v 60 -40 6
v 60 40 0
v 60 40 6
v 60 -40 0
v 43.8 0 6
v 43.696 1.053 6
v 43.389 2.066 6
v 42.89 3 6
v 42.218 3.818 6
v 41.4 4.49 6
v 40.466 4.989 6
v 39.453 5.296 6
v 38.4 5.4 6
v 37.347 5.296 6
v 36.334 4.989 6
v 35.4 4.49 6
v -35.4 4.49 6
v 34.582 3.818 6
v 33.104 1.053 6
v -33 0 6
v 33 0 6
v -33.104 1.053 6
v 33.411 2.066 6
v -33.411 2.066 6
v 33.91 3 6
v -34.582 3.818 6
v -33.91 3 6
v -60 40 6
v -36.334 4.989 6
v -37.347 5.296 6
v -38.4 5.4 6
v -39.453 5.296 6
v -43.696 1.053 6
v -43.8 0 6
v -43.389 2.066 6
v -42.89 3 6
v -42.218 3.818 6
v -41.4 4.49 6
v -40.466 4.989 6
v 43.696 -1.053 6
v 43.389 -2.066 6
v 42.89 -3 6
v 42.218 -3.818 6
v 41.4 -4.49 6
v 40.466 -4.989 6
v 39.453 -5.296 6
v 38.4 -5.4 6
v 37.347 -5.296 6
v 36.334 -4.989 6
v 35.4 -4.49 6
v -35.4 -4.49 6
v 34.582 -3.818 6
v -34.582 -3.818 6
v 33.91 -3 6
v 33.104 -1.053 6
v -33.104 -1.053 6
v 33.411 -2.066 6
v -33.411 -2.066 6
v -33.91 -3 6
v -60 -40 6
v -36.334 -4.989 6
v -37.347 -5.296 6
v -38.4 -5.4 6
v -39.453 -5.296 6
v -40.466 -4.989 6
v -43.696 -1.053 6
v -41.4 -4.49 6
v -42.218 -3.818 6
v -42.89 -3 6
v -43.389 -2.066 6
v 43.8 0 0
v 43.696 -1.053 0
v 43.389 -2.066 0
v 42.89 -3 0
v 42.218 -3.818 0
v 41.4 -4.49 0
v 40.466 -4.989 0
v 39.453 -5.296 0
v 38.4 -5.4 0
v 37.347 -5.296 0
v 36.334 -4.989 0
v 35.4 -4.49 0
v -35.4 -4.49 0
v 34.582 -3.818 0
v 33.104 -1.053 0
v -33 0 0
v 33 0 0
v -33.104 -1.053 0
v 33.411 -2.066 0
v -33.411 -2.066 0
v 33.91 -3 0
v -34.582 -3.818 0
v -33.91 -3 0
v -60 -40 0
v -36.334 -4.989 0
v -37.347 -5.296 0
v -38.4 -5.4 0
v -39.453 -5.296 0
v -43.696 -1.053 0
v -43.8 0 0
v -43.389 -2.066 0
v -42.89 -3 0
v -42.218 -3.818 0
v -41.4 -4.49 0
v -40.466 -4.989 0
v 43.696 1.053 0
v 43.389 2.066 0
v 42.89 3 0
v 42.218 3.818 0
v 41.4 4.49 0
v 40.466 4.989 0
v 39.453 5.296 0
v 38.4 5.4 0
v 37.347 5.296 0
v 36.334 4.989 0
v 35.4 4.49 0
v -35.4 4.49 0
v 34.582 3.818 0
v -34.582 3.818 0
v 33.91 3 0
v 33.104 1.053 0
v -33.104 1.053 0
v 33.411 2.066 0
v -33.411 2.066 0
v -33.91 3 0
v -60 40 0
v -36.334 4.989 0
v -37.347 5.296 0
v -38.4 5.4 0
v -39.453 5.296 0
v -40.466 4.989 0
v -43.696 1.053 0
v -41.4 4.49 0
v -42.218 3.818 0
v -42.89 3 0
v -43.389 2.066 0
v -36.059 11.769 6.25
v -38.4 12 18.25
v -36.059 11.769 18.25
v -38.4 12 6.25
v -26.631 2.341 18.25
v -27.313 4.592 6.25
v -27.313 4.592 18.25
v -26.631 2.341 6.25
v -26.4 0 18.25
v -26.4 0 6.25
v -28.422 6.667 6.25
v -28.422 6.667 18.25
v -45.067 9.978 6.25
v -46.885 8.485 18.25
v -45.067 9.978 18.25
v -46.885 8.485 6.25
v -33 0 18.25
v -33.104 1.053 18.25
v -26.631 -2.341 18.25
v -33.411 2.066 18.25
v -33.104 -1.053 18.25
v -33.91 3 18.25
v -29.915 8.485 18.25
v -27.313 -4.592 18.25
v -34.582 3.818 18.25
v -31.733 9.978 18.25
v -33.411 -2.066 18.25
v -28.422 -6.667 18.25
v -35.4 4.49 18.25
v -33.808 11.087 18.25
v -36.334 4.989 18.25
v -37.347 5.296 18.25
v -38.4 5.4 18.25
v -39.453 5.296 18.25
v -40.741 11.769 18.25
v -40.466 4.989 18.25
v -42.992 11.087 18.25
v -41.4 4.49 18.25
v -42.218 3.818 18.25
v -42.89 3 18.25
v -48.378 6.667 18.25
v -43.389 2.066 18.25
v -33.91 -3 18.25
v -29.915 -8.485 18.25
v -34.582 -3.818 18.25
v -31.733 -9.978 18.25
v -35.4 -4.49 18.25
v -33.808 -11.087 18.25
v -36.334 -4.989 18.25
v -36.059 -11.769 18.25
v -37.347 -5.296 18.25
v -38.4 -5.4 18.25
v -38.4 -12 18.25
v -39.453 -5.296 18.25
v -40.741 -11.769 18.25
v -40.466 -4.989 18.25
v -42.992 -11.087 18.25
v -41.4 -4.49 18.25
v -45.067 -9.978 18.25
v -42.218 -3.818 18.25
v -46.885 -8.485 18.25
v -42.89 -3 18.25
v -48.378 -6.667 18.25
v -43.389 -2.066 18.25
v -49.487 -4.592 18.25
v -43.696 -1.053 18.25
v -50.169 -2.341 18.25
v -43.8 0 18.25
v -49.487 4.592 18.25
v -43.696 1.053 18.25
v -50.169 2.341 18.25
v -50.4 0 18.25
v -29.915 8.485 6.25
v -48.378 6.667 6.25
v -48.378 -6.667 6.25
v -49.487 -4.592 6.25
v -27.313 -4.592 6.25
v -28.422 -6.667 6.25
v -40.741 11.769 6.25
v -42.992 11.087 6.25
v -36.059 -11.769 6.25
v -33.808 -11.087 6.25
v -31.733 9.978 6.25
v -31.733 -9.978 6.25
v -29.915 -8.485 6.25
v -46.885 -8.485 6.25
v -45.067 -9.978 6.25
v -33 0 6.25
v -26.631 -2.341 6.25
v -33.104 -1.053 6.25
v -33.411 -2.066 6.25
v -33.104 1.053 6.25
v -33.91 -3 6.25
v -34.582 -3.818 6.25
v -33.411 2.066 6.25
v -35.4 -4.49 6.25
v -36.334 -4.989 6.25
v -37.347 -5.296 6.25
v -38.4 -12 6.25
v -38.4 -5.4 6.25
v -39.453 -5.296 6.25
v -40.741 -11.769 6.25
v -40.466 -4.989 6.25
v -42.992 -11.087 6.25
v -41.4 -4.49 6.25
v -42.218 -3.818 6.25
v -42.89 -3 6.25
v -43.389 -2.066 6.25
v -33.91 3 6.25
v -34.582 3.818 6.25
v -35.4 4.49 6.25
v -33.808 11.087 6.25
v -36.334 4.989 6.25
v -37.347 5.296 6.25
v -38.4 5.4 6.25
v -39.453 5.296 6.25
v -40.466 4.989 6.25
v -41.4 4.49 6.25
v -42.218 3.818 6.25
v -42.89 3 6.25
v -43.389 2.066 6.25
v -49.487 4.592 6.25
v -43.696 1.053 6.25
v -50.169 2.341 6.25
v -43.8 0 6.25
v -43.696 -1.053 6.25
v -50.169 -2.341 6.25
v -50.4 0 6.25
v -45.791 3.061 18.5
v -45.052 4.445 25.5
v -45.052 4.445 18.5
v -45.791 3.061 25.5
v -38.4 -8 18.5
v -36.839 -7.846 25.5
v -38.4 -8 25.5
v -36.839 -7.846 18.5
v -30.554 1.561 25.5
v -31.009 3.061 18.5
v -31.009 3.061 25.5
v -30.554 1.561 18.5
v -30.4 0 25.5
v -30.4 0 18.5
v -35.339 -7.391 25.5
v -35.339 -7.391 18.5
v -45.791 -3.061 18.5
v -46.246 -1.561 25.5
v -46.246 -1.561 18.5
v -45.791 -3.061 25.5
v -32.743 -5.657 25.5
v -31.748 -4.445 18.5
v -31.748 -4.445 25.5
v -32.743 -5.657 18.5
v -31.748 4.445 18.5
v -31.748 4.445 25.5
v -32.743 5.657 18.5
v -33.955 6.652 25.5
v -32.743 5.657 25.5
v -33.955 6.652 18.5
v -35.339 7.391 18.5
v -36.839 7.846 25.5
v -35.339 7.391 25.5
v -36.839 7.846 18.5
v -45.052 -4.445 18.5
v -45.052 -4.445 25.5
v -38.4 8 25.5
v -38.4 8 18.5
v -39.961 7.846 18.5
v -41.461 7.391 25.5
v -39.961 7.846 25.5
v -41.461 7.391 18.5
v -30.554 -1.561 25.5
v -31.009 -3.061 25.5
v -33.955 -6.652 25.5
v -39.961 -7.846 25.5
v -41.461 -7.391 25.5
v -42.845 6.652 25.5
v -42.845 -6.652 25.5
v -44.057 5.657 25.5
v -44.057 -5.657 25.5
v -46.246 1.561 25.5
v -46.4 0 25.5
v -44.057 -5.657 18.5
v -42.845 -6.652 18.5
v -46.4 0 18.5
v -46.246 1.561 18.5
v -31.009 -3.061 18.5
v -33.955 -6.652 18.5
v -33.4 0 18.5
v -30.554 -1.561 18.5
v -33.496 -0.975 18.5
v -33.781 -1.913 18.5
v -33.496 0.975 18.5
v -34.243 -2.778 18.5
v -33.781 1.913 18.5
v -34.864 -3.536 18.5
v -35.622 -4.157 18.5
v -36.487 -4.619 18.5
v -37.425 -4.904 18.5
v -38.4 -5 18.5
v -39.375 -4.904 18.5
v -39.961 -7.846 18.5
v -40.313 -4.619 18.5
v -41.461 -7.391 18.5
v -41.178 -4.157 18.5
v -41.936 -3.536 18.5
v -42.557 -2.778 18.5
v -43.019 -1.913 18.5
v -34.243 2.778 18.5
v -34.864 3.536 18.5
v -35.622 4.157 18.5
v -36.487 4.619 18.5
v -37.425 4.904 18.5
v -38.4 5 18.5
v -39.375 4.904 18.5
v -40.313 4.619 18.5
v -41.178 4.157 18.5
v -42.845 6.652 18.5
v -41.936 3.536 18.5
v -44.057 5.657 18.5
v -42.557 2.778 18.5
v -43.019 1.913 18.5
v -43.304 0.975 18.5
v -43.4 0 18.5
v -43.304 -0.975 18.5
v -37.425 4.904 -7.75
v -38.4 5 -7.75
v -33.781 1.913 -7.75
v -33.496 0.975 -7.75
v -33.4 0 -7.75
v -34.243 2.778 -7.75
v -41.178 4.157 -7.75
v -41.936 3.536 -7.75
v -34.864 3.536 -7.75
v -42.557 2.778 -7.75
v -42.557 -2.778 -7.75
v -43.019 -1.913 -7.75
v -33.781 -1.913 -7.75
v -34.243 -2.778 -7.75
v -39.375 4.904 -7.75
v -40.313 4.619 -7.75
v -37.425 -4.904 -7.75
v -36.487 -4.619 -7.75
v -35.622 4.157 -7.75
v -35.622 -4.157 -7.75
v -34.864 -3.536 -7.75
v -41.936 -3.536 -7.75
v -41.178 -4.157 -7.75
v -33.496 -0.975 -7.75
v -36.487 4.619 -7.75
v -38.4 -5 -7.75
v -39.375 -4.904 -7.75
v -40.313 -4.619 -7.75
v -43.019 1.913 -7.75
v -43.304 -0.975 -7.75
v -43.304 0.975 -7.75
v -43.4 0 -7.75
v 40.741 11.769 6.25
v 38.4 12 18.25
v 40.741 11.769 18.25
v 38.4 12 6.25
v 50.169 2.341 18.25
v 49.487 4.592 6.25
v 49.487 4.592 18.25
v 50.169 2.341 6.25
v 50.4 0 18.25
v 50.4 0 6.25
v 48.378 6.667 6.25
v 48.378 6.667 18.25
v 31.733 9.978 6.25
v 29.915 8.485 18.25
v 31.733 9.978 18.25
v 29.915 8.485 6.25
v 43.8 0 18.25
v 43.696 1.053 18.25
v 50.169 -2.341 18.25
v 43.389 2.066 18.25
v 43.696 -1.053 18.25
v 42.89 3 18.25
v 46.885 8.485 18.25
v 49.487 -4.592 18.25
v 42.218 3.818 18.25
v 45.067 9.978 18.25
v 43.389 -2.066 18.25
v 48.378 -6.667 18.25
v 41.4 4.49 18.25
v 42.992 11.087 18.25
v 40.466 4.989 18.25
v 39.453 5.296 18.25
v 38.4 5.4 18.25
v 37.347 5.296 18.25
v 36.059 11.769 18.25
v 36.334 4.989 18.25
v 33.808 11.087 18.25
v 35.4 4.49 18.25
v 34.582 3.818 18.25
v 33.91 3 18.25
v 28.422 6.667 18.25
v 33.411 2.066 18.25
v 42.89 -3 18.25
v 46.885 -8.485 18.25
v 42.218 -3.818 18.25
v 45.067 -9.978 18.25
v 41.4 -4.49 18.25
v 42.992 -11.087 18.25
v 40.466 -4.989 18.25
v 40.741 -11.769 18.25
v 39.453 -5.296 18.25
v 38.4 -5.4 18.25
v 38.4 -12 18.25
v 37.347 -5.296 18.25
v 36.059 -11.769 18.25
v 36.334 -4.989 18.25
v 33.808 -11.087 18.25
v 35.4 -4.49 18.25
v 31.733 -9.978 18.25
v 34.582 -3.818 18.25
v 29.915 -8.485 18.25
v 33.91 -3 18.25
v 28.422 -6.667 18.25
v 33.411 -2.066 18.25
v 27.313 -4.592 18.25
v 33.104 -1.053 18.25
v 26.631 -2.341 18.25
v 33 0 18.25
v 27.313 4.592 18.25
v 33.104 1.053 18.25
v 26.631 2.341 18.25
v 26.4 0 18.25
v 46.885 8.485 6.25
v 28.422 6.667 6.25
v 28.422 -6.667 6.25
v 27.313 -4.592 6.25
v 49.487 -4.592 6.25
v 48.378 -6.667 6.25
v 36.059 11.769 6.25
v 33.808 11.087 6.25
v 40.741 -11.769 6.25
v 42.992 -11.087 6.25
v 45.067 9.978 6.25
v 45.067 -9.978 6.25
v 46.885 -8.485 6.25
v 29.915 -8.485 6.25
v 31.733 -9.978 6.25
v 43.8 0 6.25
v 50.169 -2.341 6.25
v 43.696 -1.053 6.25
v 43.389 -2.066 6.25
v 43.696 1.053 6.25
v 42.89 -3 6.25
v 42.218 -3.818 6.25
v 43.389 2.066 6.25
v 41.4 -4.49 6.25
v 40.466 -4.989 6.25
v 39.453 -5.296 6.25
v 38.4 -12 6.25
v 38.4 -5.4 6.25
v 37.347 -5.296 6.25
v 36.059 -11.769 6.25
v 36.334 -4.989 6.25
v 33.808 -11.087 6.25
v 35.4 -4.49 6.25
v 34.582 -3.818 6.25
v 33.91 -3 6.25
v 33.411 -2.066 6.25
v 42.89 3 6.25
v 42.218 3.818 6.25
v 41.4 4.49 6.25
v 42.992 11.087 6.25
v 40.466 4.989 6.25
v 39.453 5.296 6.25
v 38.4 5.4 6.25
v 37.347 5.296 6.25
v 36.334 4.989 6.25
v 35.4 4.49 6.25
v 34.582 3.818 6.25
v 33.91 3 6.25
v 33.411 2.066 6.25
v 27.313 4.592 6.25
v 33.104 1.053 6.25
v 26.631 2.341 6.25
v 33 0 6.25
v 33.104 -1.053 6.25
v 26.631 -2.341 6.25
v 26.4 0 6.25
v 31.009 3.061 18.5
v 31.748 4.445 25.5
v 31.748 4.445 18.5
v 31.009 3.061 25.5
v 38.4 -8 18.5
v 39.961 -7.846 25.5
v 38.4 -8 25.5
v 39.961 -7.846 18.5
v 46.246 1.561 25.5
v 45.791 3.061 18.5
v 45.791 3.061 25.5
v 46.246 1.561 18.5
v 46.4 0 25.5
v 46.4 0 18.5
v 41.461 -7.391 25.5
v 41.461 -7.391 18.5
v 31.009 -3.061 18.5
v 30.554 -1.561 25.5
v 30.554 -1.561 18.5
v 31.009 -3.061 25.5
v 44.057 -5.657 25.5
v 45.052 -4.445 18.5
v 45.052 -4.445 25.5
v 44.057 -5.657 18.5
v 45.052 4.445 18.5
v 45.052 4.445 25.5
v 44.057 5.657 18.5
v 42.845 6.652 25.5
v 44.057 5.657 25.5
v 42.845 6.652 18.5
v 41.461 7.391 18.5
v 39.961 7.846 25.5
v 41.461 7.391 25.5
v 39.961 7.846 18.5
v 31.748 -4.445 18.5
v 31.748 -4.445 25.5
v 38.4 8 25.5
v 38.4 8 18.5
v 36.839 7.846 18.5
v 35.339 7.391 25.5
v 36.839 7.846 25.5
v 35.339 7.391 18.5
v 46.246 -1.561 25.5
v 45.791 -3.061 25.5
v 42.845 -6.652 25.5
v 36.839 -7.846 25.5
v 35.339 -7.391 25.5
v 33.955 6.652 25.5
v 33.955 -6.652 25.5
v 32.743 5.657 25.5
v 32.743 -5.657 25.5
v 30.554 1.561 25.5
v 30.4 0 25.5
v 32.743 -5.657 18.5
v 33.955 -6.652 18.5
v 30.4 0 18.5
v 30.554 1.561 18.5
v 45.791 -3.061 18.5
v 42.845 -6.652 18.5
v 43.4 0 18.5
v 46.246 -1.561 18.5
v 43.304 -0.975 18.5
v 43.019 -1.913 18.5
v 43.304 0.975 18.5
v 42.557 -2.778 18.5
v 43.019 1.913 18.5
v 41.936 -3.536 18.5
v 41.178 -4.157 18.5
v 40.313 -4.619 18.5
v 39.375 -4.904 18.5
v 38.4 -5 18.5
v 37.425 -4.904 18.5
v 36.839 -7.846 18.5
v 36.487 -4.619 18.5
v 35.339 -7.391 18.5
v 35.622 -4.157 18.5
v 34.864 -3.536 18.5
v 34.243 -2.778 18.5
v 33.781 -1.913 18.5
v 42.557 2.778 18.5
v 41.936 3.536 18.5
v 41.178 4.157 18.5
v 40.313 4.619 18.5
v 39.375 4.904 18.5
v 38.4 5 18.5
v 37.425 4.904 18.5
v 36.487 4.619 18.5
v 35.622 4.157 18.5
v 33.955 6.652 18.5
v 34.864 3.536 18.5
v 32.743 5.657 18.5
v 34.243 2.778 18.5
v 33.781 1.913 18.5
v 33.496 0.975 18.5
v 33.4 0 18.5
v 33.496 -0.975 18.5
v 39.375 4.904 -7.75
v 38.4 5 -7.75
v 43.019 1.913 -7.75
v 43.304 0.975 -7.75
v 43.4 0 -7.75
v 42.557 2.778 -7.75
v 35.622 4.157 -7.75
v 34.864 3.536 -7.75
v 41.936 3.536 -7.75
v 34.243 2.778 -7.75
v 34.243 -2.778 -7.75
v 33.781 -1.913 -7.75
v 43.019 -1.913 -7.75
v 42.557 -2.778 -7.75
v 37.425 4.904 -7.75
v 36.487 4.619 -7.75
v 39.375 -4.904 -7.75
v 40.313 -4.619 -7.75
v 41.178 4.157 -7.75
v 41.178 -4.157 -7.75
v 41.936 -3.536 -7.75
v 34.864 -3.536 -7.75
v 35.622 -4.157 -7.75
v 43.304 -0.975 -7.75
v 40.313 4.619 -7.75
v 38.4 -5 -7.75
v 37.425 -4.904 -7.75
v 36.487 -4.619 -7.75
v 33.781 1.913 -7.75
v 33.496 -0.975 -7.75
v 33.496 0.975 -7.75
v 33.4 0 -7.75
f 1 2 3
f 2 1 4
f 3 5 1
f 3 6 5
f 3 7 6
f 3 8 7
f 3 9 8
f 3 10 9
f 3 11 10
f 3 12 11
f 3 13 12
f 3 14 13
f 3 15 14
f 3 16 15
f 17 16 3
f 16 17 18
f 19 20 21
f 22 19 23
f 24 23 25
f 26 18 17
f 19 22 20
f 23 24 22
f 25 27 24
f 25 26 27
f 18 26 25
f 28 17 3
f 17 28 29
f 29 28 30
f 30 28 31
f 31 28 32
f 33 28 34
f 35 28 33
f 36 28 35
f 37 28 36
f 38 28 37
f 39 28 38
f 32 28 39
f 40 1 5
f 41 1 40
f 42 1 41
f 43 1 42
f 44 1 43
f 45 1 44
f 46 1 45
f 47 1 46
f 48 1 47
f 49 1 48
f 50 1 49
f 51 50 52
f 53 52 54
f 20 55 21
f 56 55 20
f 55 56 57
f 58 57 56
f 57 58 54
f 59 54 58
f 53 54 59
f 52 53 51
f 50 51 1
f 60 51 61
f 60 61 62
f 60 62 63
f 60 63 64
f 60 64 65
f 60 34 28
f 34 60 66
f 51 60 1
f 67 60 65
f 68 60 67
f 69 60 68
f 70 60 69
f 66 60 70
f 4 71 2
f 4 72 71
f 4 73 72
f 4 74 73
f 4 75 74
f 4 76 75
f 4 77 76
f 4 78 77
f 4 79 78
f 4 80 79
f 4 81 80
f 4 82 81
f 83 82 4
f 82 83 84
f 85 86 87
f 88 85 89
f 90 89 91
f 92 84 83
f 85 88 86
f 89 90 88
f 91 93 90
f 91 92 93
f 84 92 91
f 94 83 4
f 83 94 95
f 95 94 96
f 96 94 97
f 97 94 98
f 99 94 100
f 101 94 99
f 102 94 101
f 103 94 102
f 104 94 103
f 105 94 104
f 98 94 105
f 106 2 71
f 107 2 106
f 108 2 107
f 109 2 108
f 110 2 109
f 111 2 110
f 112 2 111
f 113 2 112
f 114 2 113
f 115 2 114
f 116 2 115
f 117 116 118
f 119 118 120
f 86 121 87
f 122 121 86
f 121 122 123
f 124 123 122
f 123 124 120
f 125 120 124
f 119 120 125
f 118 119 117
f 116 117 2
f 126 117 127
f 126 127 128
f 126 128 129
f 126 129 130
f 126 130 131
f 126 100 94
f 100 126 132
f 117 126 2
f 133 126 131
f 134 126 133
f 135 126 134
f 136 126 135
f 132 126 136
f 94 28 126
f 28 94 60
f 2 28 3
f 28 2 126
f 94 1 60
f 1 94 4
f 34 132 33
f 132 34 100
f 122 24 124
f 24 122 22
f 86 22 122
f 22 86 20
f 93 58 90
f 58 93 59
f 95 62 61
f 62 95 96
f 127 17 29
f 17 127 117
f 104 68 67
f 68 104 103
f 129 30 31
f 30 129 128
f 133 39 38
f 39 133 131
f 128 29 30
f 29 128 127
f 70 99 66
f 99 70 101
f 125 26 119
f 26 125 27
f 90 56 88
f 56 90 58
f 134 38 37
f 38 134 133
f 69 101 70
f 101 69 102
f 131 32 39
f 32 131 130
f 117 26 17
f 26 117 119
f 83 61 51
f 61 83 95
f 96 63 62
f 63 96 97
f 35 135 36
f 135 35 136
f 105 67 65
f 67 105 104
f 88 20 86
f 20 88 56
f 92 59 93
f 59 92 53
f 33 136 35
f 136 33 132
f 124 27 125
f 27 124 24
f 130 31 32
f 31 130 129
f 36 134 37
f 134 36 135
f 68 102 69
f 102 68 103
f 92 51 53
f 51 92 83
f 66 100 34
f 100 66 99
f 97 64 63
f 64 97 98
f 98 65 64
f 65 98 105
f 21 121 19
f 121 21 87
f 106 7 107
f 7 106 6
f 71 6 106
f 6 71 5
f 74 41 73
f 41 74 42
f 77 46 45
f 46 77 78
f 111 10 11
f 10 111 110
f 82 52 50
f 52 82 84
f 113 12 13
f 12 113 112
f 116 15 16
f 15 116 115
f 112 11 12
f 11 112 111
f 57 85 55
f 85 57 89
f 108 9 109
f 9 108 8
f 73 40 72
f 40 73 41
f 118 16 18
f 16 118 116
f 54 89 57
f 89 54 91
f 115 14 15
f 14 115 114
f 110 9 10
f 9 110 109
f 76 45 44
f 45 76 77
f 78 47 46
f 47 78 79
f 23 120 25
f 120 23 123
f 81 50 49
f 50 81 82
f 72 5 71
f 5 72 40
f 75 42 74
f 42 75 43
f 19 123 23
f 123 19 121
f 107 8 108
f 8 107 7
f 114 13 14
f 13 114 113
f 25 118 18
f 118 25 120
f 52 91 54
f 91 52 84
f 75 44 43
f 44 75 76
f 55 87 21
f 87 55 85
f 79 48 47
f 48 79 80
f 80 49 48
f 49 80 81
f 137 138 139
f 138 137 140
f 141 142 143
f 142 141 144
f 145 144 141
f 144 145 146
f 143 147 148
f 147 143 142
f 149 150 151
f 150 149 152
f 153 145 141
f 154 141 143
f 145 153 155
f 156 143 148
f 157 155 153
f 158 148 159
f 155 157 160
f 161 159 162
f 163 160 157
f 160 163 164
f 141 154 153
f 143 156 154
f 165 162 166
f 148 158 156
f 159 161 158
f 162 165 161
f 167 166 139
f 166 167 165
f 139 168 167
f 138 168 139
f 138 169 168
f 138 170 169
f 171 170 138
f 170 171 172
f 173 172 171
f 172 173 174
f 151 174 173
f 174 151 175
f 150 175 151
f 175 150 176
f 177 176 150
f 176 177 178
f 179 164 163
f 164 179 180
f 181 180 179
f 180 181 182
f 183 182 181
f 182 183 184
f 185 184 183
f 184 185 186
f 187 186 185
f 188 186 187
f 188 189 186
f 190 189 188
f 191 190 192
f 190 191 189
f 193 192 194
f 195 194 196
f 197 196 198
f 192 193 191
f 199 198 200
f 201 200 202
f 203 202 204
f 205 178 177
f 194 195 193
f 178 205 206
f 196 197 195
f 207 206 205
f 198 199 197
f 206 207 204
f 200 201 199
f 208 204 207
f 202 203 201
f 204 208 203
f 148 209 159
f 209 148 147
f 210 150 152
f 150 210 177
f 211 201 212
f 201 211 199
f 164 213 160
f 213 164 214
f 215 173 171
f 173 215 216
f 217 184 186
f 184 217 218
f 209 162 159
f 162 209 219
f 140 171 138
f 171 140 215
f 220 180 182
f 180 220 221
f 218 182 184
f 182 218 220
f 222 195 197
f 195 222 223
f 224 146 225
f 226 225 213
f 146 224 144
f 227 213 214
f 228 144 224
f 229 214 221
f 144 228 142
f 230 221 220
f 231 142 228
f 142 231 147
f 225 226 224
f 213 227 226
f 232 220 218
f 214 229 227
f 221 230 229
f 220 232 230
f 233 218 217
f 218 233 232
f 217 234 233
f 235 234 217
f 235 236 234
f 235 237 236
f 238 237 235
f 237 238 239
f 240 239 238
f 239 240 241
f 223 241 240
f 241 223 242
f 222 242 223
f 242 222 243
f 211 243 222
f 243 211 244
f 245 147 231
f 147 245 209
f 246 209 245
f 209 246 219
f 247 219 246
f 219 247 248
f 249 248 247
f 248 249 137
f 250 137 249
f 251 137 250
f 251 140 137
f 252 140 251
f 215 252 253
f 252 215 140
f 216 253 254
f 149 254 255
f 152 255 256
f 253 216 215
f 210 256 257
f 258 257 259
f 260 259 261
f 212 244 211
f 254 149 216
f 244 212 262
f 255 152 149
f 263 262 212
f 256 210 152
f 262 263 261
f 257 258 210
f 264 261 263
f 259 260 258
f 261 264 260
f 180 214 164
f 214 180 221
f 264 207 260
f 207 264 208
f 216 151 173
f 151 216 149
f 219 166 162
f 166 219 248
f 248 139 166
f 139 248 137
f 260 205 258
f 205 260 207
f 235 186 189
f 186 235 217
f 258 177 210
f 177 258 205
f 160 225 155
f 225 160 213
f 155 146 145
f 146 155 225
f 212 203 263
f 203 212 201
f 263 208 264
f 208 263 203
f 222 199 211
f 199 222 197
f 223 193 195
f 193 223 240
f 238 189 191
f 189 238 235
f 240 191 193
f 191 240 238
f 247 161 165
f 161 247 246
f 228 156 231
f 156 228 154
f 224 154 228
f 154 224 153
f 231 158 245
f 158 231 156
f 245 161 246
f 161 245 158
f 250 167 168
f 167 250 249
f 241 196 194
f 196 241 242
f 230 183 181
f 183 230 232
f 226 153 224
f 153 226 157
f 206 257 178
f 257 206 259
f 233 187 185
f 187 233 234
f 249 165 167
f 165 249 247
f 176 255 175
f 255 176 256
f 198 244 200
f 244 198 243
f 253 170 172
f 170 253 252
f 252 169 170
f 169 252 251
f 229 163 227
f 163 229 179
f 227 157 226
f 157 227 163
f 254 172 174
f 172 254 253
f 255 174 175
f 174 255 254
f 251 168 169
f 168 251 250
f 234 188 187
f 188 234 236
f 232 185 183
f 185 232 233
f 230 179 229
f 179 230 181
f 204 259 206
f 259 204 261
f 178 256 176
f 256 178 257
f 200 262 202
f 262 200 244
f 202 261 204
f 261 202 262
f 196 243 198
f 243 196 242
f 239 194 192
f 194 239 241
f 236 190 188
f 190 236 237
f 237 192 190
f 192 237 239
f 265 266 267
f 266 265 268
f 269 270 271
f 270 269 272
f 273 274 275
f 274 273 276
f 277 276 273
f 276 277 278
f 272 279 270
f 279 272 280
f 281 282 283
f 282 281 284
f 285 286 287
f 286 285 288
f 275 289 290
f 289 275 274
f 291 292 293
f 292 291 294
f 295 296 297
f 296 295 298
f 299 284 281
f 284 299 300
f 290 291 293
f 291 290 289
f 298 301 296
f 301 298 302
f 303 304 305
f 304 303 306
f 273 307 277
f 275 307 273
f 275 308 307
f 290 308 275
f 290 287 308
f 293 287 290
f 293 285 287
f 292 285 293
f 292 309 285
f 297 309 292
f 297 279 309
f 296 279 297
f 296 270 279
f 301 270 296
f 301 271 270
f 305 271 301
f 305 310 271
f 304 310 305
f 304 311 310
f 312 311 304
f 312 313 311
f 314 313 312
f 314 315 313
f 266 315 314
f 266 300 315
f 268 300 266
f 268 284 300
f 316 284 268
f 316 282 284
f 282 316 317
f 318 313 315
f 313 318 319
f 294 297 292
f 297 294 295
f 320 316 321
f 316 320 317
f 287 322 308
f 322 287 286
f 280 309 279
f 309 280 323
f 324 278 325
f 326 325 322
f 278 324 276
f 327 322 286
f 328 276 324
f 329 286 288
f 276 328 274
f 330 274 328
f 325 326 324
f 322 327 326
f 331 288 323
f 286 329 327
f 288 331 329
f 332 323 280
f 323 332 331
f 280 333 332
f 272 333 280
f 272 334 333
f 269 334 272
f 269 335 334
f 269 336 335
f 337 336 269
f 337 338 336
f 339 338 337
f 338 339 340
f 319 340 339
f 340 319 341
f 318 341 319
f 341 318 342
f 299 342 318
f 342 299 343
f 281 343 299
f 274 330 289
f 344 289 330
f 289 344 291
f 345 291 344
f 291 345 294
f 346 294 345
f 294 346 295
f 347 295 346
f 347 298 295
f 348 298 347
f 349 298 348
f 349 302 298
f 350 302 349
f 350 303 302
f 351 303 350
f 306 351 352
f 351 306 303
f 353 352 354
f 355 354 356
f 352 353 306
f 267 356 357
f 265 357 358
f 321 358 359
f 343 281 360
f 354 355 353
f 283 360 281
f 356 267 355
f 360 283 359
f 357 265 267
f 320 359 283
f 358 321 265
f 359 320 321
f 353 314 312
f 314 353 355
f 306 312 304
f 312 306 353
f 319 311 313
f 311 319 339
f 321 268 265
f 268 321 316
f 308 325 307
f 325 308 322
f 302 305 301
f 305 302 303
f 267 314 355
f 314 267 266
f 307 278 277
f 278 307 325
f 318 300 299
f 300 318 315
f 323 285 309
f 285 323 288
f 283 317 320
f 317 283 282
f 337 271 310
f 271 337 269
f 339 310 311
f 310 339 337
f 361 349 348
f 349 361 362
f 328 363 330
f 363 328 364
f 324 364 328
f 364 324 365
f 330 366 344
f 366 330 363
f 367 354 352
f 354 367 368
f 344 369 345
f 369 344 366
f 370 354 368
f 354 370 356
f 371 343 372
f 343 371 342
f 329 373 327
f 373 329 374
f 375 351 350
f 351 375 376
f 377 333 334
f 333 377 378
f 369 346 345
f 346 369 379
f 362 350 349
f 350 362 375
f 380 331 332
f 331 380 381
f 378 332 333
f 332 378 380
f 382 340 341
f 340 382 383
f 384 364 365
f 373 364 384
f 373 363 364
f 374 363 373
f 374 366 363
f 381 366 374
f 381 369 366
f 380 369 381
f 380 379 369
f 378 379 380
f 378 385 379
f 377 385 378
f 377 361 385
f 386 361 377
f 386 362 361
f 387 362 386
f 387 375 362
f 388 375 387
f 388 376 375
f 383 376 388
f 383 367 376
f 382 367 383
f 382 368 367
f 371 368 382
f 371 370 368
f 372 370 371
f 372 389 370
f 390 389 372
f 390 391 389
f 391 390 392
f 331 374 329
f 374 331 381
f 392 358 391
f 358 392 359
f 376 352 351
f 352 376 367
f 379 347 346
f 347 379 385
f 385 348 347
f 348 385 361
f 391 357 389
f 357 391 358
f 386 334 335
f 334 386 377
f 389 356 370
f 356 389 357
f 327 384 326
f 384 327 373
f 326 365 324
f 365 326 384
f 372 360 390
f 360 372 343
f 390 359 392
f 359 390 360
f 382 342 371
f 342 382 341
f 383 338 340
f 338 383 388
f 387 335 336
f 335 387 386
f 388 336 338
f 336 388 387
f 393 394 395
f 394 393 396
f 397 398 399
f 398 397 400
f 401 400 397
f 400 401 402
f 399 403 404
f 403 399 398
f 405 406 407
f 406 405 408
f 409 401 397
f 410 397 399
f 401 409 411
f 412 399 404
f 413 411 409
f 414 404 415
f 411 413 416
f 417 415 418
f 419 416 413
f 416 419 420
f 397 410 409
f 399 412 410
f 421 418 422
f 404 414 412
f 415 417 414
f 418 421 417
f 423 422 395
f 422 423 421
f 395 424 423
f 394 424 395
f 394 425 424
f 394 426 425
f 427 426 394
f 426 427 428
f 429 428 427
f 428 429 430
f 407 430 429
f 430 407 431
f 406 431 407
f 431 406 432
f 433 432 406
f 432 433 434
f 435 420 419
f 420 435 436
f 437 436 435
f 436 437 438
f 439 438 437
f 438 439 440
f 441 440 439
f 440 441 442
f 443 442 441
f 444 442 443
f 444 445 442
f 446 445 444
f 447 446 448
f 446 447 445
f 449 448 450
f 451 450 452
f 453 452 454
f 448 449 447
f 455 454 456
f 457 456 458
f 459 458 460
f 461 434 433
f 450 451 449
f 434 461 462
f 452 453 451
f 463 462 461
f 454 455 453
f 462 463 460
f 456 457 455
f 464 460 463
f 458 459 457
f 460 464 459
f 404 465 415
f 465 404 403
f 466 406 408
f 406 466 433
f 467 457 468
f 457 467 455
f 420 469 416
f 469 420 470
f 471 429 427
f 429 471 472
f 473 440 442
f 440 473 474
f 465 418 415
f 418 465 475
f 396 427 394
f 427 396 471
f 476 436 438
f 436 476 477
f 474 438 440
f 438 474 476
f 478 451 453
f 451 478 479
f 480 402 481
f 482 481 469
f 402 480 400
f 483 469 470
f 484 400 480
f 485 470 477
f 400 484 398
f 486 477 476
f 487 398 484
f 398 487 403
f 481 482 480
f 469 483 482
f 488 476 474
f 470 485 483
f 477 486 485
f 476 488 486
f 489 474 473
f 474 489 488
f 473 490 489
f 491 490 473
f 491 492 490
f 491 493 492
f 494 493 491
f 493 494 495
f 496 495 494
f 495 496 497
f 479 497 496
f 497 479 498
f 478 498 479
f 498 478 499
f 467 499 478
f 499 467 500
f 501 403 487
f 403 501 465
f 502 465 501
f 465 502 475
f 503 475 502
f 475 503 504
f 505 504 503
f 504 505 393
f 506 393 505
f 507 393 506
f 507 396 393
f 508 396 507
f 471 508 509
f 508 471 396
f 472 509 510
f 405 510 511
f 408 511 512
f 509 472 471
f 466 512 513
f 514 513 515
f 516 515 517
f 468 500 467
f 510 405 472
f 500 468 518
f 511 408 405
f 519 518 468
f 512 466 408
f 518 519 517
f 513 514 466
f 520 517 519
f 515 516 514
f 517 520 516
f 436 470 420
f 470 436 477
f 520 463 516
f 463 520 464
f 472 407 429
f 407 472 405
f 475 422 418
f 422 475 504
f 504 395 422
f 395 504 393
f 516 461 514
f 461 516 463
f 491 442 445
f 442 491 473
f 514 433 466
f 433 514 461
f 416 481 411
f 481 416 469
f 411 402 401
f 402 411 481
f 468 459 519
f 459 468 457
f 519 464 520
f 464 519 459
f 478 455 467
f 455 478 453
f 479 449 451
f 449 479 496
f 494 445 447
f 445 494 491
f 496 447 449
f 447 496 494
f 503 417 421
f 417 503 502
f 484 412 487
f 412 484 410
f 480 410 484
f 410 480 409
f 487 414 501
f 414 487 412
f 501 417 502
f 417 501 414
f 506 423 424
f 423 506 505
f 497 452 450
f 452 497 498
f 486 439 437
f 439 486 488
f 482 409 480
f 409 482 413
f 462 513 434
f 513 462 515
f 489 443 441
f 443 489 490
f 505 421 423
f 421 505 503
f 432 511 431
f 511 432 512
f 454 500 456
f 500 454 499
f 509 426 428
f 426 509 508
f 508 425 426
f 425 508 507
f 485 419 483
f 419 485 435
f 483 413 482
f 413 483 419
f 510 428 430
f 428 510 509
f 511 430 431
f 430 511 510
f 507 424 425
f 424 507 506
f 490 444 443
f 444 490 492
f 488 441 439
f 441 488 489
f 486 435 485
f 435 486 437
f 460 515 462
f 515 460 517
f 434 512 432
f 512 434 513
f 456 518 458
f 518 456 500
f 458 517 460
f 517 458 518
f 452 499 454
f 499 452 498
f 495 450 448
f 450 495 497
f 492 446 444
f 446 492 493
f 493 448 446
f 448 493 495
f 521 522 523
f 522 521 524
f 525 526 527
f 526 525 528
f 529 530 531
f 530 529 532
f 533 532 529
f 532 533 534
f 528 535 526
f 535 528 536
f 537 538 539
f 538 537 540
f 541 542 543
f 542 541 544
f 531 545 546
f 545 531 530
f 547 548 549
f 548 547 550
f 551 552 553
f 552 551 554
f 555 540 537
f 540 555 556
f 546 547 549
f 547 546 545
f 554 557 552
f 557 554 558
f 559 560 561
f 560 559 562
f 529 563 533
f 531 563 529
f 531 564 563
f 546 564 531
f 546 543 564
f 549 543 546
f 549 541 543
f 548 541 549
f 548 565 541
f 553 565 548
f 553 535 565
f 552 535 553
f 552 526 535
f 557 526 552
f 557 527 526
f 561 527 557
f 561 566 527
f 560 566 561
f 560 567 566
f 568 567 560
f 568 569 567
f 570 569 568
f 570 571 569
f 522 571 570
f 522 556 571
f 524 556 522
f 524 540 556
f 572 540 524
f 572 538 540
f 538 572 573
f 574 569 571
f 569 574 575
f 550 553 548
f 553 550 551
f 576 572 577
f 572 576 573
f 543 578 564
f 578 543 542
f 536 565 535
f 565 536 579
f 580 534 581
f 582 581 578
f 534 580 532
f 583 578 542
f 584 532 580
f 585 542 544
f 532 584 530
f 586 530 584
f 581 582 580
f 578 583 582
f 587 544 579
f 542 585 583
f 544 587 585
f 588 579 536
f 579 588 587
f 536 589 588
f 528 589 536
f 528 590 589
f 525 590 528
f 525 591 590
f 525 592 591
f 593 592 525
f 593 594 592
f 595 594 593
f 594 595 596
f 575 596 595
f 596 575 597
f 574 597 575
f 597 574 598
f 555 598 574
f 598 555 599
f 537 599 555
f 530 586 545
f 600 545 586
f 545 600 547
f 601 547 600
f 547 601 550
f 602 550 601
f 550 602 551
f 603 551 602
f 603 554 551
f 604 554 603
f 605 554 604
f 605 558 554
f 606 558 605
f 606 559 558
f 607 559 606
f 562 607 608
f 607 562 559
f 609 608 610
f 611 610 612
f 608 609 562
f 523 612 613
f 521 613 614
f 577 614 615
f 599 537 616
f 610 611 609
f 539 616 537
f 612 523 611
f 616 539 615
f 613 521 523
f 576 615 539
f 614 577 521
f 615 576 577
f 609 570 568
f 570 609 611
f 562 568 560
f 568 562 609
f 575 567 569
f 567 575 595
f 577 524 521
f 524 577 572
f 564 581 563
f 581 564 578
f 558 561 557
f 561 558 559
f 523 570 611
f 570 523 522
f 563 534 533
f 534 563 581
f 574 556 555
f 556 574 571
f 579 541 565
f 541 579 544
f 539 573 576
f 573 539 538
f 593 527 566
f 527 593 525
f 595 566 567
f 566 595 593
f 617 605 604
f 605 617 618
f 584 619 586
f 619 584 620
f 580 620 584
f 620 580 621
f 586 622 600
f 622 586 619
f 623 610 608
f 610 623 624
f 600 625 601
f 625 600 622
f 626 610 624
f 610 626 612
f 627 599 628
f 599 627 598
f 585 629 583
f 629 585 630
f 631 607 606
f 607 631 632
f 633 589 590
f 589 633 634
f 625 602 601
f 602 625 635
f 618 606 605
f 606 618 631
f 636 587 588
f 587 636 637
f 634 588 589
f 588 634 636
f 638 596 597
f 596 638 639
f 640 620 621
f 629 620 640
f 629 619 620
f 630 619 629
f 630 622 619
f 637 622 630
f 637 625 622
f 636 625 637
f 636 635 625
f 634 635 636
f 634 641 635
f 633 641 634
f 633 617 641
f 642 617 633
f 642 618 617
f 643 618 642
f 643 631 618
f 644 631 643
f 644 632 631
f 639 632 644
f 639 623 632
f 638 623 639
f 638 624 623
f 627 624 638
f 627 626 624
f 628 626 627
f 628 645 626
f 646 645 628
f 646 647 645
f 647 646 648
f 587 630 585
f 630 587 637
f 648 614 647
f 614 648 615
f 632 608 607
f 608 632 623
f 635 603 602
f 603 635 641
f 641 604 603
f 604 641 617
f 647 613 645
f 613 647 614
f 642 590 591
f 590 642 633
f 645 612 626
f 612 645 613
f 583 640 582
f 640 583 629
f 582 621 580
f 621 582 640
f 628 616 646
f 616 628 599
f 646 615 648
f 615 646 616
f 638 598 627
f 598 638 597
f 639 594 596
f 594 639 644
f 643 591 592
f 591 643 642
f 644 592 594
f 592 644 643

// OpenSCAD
$fn = 32;

// ------------------------------------------------------------------------
// Standoff columns: 2 d24 standoffs, bolts d10
// Every part is its own module, assembly() places them once.
// ------------------------------------------------------------------------

// --- part 1 ---
module base_plate() {
  difference() {
    translate([-60, -40, 0]) cube([120, 80, 6]);
    translate([-38.4, 0, -1]) cylinder(h = 8, d = 10.8);
    translate([38.4, 0, -1]) cylinder(h = 8, d = 10.8);
  }
}

// --- part 2 ---
module spacer1() {
  difference() {
      translate([0, 0, 0]) cylinder(h = 12, d = 24);
      translate([0, 0, -1]) cylinder(h = 14, d = 10.8);
    }
}

// --- part 3 ---
module bolt1() {
  cylinder(h = 7, d = 16);
  translate([0, 0, -26.25]) cylinder(h = 26.25, d = 10);
}

// --- part 4 ---
module spacer2() {
  difference() {
      translate([0, 0, 0]) cylinder(h = 12, d = 24);
      translate([0, 0, -1]) cylinder(h = 14, d = 10.8);
    }
}

// --- part 5 ---
module bolt2() {
  cylinder(h = 7, d = 16);
  translate([0, 0, -26.25]) cylinder(h = 26.25, d = 10);
}

// --- assembly ---
module assembly() {
  translate([0, 0, 0]) rotate([0, 0, 0]) base_plate();
  translate([-38.4, 0, 6.25]) rotate([0, 0, 0]) spacer1();
  translate([-38.4, 0, 18.5]) rotate([0, 0, 0]) bolt1();
  translate([38.4, 0, 6.25]) rotate([0, 0, 0]) spacer2();
  translate([38.4, 0, 18.5]) rotate([0, 0, 0]) bolt2();
}

assembly();
